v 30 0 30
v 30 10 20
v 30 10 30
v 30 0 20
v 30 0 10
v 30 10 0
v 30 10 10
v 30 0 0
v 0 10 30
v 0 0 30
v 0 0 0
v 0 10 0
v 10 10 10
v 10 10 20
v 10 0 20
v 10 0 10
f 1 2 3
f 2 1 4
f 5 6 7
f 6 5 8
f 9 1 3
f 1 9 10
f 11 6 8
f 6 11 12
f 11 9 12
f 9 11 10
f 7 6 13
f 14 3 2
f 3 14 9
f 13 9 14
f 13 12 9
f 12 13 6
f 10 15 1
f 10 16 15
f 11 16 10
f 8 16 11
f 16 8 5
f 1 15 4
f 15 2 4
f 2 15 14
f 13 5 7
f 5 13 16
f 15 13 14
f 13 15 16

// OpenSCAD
difference() {
	cube([30, 10, 30]);
	translate([10, 0, 10]) {
		cube([20, 10, 10]);
	}
}
